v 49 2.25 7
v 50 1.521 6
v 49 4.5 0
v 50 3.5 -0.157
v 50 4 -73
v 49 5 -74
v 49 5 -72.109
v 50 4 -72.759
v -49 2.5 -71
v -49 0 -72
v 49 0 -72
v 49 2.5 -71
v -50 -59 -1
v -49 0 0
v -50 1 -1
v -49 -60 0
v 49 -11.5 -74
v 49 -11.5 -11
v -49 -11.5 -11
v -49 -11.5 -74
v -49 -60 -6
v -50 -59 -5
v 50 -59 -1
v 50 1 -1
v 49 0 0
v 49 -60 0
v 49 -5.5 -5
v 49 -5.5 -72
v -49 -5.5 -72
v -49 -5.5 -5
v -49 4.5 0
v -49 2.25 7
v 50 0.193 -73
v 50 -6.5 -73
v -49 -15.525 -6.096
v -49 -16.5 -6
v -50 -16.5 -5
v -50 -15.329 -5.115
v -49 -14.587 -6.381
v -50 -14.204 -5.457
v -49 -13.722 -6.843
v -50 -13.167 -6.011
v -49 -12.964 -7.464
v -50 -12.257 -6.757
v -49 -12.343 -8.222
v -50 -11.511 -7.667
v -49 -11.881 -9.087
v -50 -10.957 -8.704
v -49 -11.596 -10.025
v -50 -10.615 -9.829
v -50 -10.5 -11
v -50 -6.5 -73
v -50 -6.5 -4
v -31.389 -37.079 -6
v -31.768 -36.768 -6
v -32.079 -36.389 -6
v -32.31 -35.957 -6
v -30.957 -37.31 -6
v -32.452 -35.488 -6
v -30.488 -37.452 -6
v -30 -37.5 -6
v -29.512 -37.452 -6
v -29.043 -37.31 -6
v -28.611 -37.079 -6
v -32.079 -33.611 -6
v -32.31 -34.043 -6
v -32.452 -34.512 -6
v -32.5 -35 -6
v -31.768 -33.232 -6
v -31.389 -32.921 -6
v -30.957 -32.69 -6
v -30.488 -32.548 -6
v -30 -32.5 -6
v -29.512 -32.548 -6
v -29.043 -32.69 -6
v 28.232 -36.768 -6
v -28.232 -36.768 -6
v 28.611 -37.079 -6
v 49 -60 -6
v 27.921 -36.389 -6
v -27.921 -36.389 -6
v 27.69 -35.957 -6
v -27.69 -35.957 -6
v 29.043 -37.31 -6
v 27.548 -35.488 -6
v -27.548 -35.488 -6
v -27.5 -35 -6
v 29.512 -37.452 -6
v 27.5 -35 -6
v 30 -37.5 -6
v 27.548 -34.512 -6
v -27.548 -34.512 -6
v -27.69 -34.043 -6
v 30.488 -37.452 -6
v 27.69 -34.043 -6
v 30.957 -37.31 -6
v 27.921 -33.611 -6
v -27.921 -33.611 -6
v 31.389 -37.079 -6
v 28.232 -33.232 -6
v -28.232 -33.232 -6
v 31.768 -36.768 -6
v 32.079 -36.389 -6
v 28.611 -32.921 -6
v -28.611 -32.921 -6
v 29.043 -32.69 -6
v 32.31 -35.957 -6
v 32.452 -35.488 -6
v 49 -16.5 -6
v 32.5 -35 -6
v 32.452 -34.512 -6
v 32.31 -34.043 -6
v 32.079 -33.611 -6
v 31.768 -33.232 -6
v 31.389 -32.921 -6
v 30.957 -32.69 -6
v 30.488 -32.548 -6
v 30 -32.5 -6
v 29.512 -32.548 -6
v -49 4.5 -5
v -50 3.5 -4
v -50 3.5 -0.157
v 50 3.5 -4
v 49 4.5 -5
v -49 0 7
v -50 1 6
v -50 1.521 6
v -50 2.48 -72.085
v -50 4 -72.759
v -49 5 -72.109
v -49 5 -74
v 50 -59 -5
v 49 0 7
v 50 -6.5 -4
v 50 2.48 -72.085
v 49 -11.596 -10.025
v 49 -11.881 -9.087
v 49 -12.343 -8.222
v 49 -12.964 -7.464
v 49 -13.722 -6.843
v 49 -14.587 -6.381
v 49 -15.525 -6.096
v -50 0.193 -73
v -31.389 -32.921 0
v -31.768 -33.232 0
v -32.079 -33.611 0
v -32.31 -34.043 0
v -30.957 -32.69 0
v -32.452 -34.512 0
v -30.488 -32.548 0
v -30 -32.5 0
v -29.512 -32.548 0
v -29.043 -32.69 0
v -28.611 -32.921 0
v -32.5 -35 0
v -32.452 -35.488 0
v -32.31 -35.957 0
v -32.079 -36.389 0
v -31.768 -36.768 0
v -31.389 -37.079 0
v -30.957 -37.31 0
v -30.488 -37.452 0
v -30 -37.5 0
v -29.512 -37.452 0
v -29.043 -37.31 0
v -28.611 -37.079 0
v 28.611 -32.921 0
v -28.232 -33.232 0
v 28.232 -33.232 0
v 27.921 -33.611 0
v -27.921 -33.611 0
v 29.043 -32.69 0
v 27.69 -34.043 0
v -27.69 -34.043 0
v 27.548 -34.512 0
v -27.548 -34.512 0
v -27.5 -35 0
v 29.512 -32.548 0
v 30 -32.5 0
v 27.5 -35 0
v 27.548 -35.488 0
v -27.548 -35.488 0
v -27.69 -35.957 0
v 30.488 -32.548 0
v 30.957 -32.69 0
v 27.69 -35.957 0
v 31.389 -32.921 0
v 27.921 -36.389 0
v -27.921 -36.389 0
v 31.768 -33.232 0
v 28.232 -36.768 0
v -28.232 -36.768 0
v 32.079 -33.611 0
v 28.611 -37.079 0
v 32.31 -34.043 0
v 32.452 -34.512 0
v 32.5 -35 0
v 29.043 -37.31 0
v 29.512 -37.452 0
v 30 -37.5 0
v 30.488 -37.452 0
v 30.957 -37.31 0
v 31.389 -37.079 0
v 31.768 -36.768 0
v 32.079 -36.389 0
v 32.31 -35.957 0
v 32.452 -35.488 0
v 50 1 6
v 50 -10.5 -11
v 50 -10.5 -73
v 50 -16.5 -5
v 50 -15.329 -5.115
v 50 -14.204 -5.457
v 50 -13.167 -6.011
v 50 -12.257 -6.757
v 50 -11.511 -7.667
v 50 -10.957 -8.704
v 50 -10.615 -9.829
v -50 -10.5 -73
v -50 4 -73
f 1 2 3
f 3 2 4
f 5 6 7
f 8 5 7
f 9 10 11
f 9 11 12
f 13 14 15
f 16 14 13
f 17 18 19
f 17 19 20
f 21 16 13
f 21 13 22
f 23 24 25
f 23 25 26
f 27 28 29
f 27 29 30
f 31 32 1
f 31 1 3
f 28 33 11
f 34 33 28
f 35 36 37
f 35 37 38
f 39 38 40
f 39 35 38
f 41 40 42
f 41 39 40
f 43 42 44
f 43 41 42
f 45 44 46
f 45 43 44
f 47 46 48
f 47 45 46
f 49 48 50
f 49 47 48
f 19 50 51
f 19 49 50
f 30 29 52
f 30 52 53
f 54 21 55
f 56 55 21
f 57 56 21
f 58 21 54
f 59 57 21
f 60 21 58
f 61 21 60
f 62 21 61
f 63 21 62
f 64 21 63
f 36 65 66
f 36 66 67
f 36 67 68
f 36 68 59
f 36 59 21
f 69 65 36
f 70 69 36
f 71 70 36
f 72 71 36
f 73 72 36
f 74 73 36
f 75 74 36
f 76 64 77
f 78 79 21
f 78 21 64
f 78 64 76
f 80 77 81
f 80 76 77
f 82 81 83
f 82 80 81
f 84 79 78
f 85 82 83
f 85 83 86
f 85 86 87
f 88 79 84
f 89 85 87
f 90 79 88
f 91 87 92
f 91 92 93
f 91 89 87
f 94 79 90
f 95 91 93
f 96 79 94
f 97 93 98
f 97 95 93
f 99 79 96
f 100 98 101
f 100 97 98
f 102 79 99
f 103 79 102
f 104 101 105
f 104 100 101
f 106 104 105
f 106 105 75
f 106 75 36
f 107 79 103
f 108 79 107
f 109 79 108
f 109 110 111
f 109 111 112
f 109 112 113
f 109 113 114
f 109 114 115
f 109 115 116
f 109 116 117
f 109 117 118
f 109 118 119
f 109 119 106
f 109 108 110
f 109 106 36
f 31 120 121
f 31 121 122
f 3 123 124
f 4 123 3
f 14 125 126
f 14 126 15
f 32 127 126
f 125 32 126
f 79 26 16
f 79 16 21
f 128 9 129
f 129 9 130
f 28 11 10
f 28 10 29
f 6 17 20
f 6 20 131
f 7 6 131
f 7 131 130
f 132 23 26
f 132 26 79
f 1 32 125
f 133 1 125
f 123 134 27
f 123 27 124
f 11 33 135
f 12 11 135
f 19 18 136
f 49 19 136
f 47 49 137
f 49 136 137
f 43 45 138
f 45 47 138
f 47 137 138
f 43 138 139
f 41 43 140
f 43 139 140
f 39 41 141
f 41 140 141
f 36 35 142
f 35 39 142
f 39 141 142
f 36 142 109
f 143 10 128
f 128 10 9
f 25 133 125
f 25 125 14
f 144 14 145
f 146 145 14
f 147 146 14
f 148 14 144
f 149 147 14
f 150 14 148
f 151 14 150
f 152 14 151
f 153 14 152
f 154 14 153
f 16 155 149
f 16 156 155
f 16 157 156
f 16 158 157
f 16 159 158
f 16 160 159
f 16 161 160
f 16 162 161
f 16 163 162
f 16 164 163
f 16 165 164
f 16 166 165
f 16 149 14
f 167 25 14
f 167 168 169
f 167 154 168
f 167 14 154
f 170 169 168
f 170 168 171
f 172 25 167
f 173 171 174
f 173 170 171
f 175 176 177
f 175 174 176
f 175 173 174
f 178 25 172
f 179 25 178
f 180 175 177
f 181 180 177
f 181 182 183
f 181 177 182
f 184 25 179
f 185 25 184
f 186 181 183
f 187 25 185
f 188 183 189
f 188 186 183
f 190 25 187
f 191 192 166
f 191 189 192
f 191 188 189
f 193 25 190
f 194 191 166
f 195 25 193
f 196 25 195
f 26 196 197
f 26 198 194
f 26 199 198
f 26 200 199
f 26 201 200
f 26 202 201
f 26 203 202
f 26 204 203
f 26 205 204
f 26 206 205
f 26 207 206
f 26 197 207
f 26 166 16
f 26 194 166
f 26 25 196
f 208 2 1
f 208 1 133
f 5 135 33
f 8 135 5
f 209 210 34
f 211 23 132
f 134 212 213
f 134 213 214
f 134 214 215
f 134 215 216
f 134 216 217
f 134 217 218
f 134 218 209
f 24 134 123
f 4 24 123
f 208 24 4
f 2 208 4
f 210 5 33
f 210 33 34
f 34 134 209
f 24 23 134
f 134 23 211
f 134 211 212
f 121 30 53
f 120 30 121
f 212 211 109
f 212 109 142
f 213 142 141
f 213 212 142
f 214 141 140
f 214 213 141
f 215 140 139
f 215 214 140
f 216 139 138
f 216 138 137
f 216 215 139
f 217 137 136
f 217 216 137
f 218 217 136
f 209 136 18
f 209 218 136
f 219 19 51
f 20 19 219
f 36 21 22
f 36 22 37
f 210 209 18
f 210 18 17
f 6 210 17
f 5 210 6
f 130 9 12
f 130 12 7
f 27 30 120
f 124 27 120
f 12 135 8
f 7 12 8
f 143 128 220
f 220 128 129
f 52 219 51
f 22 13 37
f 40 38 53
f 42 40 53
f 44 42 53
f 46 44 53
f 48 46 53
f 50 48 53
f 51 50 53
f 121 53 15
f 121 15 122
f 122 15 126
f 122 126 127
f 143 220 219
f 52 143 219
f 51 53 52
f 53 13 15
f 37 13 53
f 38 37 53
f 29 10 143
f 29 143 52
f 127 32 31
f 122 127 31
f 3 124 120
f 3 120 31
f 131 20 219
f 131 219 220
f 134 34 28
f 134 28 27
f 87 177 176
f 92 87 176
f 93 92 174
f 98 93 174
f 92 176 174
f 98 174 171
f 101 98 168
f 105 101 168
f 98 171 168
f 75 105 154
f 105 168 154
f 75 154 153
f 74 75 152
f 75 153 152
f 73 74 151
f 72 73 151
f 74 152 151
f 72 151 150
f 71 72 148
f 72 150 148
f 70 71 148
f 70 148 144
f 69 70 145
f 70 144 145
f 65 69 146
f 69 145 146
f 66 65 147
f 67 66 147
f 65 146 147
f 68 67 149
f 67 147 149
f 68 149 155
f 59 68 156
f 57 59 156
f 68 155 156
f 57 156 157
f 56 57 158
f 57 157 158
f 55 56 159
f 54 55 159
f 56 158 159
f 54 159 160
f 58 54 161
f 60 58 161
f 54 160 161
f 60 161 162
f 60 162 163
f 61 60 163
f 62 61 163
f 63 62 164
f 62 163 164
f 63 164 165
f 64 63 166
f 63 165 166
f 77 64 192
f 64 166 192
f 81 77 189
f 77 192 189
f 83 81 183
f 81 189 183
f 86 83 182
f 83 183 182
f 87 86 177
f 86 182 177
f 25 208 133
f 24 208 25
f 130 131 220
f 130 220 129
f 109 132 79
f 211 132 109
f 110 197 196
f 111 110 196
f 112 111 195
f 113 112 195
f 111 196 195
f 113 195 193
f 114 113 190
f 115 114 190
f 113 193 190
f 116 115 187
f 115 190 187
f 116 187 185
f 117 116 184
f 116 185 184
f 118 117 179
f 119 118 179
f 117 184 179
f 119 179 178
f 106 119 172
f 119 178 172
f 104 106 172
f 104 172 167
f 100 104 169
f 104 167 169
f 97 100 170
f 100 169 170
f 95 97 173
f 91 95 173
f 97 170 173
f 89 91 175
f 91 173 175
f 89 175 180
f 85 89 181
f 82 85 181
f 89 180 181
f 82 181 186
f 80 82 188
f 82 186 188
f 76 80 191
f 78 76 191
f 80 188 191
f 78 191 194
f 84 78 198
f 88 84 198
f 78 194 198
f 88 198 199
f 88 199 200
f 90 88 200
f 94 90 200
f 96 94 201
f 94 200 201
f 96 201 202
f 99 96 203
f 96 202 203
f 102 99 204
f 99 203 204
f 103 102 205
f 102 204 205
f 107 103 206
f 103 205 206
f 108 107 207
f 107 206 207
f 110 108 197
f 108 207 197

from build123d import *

# Parameters (mm, degrees)
F1_DEPTH = 50
F3_DEPTH = 100
F5_DEPTH = 100
F6_R     = 2.5
F7_DEPTH = 6
F8_R     = 5
F9_SIZE  = 0.99999


# Not quite as in the source:
# - a fillet or chamfer is up to 0.001 mm smaller than in the source, because OpenCascade refuses the exact size


with BuildPart() as f1:
    # F0 (on Right) → F1 (new body, symmetric)
    with BuildSketch(Plane.YZ):
        Polygon((0, 7), (0, 0), (-60, 0), (-60, -6), (-11.5, -6), (-11.5, -74), (5, -74), (5, -71), (0, -71), (0, -72), (-5.5, -72), (-5.5, -5), (4.5, -5), (4.5, 7), align=None)
    extrude(amount=F1_DEPTH, both=True)

    # F2 (on face) → F3 (cut, through all)
    with BuildSketch(Plane.YZ.offset(50)):
        Polygon((4.5, 7), (2.25, 7), (4.5, 0), align=None)
    extrude(amount=-F3_DEPTH, mode=Mode.SUBTRACT)

    # F4 (on face) → F5 (cut, through all)
    with BuildSketch(Plane.YZ.offset(50)):
        Polygon((0, -71), (0, -72), (2.5, -71), align=None)
        Polygon((5, -71), (2.5, -71), (5, -72.108708322), align=None)
    extrude(amount=-F5_DEPTH, mode=Mode.SUBTRACT)

    # F6 (on face) → F7 (cut, through all)
    with BuildSketch(Plane.XY):
        with Locations((-30, -35)):
            Circle(F6_R)
        with Locations((30, -35)):
            Circle(F6_R)
    extrude(amount=-F7_DEPTH, mode=Mode.SUBTRACT)

    # F8
    f8_edges = [f1.edges().sort_by_distance(p)[0] for p in [
        (0, -11.5, -6),
    ]]
    fillet(f8_edges, radius=F8_R)

    # F9 (size 1 in the source; OpenCascade refuses exactly that, so slightly less here)
    f9_edges = [f1.edges().sort_by_distance(p)[0] for p in [
        (50, -11.5, -42.5),
        (50, -12.964466, -7.464466),
        (50, -3.25, -74),
        (50, -38.25, -6),
        (50, 5, -73.054354),
        (50, -60, -3),
        (50, 3.75, -71.554354),
        (50, -30, 0),
        (50, 1.25, -71.5),
        (50, 0, 3.5),
        (50, -2.75, -72),
        (50, 1.125, 7),
        (50, -5.5, -38.5),
        (50, 3.375, 3.5),
        (50, -0.5, -5),
        (50, 4.5, -2.5),
        (-50, -11.5, -42.5),
        (-50, -12.964466, -7.464466),
        (-50, -3.25, -74),
        (-50, -38.25, -6),
        (-50, 5, -73.054354),
        (-50, -60, -3),
        (-50, 3.75, -71.554354),
        (-50, -30, 0),
        (-50, 1.25, -71.5),
        (-50, 0, 3.5),
        (-50, -2.75, -72),
        (-50, 1.125, 7),
        (-50, -5.5, -38.5),
        (-50, 3.375, 3.5),
        (-50, -0.5, -5),
        (-50, 4.5, -2.5),
    ]]
    chamfer(f9_edges, length=F9_SIZE)


solid = f1.part
